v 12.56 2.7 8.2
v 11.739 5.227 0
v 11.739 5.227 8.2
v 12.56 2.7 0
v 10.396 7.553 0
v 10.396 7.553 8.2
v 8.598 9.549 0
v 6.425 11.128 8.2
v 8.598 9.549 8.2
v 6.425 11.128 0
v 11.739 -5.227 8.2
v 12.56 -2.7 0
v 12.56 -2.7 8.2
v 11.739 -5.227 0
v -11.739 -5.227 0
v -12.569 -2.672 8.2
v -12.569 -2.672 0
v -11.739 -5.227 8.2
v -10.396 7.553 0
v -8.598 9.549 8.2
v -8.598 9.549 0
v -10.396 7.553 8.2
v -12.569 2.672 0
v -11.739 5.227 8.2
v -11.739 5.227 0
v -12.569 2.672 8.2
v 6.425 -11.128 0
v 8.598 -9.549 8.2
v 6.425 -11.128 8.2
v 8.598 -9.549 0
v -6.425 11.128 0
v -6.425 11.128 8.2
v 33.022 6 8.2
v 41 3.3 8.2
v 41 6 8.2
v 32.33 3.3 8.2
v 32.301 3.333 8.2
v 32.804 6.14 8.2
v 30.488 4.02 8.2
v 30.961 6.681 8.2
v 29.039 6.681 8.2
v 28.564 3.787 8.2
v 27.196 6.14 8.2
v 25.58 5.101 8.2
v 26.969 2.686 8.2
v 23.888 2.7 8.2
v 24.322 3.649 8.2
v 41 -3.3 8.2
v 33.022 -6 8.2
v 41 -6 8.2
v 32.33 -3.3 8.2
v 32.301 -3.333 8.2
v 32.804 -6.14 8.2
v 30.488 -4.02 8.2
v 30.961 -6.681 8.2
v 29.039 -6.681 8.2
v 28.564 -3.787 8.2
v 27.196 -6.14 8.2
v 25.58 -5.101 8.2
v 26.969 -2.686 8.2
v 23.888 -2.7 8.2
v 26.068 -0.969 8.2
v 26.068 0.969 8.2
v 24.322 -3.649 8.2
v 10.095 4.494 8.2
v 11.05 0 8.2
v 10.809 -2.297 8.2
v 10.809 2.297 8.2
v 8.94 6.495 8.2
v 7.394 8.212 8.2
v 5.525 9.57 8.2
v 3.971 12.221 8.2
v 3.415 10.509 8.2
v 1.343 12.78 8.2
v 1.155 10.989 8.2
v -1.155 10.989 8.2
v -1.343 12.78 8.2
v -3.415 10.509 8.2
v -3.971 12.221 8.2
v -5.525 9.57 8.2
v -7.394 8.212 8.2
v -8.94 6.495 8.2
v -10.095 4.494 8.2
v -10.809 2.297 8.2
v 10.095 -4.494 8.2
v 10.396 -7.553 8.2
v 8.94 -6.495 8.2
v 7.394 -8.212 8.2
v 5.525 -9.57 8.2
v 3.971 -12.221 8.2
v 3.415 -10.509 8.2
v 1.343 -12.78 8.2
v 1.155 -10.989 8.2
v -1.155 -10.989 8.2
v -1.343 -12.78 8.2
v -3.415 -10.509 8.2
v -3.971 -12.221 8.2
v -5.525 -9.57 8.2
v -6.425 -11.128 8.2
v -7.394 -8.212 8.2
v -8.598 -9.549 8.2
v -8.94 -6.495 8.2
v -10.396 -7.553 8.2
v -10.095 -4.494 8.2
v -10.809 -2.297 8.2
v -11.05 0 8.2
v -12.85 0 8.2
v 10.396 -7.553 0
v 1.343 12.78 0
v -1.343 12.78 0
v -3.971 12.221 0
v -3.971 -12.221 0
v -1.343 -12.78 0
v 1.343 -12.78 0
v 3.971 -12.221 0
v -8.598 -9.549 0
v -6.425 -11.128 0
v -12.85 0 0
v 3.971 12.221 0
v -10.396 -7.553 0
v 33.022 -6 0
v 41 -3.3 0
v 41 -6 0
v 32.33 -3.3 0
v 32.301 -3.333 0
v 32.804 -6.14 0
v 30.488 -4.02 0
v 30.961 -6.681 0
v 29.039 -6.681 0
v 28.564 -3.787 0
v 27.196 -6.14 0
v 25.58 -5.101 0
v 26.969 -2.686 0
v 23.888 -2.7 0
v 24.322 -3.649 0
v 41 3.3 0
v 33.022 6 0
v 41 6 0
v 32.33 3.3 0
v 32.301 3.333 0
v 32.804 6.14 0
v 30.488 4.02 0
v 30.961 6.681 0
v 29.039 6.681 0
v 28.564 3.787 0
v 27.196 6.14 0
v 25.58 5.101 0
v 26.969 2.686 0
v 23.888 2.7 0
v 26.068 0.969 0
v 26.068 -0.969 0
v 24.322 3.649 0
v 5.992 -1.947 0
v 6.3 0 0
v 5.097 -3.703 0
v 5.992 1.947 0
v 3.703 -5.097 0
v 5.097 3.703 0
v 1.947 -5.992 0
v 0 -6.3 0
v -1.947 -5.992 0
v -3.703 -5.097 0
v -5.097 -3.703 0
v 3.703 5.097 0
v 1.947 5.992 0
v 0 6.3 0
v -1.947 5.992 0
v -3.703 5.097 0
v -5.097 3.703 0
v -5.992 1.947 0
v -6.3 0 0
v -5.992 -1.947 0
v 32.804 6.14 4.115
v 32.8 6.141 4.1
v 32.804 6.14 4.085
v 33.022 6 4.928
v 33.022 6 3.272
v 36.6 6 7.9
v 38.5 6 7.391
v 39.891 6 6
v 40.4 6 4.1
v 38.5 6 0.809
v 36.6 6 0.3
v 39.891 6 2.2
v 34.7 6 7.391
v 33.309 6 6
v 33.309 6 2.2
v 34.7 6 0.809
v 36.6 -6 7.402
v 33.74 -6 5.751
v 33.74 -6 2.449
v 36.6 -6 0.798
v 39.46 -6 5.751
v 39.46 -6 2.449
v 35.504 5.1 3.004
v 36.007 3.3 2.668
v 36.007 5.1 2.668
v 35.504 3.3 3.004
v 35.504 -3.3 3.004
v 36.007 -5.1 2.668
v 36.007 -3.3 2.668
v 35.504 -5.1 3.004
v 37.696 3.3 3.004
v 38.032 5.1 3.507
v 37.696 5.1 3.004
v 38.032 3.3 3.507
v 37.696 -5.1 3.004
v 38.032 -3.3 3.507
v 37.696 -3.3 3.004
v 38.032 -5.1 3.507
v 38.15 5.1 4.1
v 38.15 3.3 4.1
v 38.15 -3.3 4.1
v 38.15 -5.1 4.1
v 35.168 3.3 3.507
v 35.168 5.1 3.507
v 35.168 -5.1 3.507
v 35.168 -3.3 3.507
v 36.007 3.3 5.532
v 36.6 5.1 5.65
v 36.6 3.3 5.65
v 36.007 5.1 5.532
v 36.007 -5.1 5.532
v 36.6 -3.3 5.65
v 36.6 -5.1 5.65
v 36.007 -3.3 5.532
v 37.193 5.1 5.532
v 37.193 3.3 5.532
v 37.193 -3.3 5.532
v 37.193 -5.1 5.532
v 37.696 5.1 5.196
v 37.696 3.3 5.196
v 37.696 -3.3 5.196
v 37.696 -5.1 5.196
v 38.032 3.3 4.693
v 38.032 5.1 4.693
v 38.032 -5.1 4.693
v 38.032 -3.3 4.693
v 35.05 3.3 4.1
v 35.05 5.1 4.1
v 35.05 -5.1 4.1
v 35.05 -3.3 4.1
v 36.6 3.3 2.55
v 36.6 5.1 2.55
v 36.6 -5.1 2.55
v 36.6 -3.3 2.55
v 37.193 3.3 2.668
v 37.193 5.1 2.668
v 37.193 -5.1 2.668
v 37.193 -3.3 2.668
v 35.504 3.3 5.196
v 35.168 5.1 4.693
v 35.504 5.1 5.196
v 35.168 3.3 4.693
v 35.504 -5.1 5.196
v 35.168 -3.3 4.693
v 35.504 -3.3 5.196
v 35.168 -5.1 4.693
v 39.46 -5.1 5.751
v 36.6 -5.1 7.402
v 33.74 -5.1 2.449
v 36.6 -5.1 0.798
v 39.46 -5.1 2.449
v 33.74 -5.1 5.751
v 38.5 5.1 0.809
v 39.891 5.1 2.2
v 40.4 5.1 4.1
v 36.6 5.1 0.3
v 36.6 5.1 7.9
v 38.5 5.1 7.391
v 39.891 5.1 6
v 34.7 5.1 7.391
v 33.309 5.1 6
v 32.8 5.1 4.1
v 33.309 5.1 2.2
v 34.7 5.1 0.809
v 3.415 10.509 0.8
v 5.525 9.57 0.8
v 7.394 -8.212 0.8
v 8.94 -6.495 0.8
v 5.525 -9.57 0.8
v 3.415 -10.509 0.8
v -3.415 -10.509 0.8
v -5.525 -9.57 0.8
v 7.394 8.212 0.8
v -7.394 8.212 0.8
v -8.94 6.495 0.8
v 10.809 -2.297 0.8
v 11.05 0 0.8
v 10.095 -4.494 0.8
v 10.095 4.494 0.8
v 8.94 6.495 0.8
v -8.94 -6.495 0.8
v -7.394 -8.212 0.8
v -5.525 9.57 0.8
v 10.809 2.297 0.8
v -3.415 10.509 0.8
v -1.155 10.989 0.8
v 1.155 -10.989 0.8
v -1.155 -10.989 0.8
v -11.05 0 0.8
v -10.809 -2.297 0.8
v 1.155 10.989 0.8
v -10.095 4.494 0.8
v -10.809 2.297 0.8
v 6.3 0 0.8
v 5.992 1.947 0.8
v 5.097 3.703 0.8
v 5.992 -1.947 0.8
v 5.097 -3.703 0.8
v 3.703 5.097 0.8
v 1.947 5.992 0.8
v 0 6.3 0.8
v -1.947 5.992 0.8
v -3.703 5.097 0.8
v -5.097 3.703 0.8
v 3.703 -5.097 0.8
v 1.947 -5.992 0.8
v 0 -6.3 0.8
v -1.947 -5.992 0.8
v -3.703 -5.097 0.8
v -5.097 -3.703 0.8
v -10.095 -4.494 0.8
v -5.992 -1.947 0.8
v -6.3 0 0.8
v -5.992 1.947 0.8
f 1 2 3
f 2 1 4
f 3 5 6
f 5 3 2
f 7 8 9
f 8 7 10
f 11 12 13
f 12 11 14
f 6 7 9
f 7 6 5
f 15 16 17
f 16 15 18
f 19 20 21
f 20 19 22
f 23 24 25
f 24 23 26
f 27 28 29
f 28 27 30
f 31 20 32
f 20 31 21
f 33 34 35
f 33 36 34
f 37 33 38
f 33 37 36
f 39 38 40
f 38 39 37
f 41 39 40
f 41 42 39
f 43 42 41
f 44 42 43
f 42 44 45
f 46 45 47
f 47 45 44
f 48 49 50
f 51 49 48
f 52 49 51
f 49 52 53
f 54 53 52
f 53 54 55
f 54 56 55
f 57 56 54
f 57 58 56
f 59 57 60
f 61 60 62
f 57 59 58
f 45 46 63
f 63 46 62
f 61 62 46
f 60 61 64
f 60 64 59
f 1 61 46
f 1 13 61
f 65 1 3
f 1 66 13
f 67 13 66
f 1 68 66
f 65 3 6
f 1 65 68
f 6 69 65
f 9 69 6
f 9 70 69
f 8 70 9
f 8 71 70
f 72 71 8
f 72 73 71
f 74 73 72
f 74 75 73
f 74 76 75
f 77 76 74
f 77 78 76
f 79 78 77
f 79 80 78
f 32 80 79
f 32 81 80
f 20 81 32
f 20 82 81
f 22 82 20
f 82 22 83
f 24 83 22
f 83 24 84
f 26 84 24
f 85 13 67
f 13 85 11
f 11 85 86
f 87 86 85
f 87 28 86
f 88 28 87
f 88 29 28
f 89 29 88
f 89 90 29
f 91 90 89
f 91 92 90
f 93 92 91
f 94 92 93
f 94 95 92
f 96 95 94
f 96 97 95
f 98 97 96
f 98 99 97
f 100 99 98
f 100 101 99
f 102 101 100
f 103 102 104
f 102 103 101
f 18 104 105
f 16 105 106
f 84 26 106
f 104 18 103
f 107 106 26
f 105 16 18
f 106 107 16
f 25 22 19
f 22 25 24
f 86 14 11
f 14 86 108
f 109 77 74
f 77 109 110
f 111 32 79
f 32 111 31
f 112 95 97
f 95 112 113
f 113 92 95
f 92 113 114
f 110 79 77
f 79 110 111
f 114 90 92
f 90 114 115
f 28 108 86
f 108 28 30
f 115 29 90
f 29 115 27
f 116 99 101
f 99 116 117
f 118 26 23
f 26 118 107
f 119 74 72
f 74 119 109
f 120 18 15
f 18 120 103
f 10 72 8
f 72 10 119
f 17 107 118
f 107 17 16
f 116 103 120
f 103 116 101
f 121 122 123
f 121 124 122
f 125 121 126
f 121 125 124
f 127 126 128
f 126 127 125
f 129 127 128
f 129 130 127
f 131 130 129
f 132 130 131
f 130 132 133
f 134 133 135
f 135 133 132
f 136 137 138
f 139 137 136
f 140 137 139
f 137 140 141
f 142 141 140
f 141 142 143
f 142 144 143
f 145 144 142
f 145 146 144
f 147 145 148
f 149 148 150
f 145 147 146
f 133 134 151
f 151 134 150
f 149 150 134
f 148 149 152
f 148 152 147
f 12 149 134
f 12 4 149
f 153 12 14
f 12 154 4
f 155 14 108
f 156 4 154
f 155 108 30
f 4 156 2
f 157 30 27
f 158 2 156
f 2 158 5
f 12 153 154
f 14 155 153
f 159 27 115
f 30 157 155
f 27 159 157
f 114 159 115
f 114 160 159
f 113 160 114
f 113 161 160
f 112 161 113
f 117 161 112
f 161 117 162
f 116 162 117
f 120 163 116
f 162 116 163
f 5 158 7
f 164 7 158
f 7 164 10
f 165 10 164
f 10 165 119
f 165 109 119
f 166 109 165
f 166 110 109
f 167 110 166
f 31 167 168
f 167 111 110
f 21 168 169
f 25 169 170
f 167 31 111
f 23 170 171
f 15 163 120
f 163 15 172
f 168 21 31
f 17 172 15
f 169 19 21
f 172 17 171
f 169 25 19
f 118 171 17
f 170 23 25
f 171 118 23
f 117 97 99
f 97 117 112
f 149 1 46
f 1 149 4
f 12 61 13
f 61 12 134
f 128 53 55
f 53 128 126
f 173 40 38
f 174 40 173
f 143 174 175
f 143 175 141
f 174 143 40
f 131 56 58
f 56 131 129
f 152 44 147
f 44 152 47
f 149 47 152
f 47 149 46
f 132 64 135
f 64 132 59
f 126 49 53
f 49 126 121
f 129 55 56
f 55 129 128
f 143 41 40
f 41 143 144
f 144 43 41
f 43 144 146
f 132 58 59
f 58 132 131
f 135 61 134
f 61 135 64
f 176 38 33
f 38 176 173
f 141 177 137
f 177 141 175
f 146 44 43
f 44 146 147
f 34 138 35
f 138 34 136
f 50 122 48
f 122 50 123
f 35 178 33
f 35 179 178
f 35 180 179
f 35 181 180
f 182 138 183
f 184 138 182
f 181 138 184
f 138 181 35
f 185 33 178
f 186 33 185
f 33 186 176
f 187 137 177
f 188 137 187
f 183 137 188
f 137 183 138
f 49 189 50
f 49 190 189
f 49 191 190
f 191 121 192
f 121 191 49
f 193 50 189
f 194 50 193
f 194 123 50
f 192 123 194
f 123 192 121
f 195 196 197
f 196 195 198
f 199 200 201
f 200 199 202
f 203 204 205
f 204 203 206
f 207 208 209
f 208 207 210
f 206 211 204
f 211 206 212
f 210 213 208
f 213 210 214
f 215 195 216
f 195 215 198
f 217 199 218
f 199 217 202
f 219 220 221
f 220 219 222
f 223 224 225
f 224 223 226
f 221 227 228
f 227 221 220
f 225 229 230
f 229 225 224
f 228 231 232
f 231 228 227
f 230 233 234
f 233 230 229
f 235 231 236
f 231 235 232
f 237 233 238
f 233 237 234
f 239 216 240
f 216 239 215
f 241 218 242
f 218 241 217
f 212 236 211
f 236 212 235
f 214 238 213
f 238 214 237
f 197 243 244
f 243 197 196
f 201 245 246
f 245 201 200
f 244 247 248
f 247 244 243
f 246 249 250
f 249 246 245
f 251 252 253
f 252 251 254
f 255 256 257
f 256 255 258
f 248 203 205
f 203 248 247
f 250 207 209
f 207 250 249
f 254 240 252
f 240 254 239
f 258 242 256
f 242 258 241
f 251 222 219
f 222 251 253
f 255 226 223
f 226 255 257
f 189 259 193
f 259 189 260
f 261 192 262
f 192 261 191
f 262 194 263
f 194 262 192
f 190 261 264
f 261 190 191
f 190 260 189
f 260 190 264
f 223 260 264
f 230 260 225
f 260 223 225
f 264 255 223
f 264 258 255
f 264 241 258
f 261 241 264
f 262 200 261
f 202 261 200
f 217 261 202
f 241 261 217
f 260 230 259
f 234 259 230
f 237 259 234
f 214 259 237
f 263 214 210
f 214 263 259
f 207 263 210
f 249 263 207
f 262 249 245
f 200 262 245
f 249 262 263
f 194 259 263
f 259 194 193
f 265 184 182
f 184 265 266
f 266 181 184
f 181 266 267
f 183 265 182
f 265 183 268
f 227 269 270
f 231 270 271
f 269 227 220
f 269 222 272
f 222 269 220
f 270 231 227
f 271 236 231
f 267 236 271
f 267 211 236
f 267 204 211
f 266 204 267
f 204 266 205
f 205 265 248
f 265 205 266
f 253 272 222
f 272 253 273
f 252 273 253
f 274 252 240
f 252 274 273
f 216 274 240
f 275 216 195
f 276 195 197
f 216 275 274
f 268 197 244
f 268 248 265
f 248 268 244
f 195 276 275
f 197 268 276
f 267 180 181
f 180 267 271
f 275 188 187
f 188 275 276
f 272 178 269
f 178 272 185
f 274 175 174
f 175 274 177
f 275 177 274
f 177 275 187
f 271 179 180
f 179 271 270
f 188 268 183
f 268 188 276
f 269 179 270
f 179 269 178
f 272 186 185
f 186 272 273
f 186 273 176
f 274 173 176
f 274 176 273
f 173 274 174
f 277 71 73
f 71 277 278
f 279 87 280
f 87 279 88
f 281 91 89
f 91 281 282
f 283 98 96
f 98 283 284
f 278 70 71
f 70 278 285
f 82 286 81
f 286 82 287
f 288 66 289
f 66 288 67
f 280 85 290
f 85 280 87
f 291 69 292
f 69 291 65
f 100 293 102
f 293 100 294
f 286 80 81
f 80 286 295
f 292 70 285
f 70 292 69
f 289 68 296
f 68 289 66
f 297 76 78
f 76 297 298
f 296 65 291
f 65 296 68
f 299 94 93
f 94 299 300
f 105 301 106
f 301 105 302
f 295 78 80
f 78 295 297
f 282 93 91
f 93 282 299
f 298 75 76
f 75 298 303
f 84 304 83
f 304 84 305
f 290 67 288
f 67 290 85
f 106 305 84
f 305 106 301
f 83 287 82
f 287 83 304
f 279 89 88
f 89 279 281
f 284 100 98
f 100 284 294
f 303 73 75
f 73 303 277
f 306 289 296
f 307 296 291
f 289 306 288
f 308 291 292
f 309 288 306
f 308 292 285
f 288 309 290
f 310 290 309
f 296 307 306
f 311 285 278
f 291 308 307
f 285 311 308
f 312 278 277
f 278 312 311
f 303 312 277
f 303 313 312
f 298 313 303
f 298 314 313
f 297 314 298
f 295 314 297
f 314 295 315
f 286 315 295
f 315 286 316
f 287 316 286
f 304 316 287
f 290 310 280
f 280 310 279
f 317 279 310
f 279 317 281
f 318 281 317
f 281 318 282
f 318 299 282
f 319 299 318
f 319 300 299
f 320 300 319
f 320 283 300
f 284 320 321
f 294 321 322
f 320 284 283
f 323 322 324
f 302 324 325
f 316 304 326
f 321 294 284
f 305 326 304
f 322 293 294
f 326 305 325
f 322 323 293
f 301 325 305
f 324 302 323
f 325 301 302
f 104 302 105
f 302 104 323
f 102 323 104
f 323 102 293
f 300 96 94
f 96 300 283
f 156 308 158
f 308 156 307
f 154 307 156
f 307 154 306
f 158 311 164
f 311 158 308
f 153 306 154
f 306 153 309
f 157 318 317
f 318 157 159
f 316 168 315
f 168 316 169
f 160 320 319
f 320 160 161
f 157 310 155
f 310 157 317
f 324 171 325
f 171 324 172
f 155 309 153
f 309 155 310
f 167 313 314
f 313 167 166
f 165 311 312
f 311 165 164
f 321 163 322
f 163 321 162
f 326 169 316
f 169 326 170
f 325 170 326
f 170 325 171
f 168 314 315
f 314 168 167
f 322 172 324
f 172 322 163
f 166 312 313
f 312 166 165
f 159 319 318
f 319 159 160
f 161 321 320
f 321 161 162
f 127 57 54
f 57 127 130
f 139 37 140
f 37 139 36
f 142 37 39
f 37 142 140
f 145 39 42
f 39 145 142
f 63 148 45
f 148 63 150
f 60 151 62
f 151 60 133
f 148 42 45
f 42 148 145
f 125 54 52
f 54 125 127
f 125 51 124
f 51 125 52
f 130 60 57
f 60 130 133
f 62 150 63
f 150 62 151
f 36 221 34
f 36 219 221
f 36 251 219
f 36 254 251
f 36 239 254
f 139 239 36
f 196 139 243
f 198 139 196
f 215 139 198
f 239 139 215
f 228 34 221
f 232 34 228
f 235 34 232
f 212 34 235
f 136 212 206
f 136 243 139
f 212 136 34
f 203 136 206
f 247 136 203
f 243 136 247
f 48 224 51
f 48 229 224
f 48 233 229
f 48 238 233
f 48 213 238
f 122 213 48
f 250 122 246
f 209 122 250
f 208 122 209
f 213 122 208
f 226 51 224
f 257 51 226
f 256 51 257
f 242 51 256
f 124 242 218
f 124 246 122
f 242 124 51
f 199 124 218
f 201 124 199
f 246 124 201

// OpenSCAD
/*
 * Z Thread Holder
 *
 * (C) Michel Pollet <buserror@gmail.com>
 *
 ************************LICENSING TERMS***************************
 * This part is not for commercial distribution without a commercial 
 * license acquired from the author. Distribution on a small scale 
 * basis (< 25 units) in the Reprap spirit is free of charge on the
 * basis of mentioning the Author with the bill of material, any 
 * wider distribution requires my explicit, written permission.
 ******************************************************************
 *
 * This allows to trap the Z threaded rod at exactly the 30mm from
 * the smooth rod using a 608 bearing.
 */

FilamentThickness = 0.45;
LayerHeight = 0.20;

BearingR = 22.1 / 2;
BearingH = 7;
BearingInsideR = 12.6 / 2;
RodR = 8.1 / 2;
RodDistance = 30;
WallW = 6 * FilamentThickness;

BearingWallW = 4 * FilamentThickness;
FloorH = 4 * LayerHeight;
ClampL = 11;
ClampW = 12;
LinkW = 2*WallW;

ScrewR = 3.1 / 2;
NutR = 5.72 /2;
NutH = 2.1;
NutInset = 2*FilamentThickness;
WasherR = 7.6 / 2;
WasherInset = 2*FilamentThickness;

ScrewOffset = (ClampL / 5) * 3;
TotalH = FloorH + BearingH + (2*LayerHeight);

difference() {
	outside();
	inside();
}

module outside() {

	cylinder(r = BearingR + BearingWallW, h = TotalH);

	translate([0,-LinkW/2,0])
		cube([RodDistance, LinkW, TotalH]);
	
	translate([RodDistance,0,0])
		cylinder(r = RodR + WallW, h = TotalH);		

	translate([RodDistance,-(ClampW/2),0])
		cube([ClampL, ClampW, TotalH]);

}


module inside() {

	translate([0, 0, FloorH])
		cylinder(r = BearingR, h = TotalH + 1);
	
	translate([0, 0, -1])
		cylinder(r = BearingInsideR, h = TotalH + 2);

	translate([RodDistance,0,-1])
		cylinder(r = RodR, h = TotalH + 2);		

	translate([RodDistance,-(ClampW/2) + WallW, -1])
		cube([ClampL + 1, ClampW-(2*WallW), TotalH +2]);

	translate([RodDistance + ScrewOffset, -(ClampW/2), TotalH / 2]) {
		translate([0,-1,0])
			rotate([-90,0,0])
				cylinder(r = ScrewR, h = ClampW + 2, $fn = 16);
		translate([0,-NutH + NutInset,0])
			rotate([-90,30,0])
				nut(r = NutR, h = NutH);
		translate([0,ClampW - WasherInset,0])
			rotate([-90,0,0])
				cylinder(r = WasherR, h = 3);
	}
}


module nut(d = 0, r = 0, h) {
	realr =  ((d > 0) ? d / 2 : r) / cos (180 / 6);
	cylinder(r = realr, h = h, $fn = 6);
}
